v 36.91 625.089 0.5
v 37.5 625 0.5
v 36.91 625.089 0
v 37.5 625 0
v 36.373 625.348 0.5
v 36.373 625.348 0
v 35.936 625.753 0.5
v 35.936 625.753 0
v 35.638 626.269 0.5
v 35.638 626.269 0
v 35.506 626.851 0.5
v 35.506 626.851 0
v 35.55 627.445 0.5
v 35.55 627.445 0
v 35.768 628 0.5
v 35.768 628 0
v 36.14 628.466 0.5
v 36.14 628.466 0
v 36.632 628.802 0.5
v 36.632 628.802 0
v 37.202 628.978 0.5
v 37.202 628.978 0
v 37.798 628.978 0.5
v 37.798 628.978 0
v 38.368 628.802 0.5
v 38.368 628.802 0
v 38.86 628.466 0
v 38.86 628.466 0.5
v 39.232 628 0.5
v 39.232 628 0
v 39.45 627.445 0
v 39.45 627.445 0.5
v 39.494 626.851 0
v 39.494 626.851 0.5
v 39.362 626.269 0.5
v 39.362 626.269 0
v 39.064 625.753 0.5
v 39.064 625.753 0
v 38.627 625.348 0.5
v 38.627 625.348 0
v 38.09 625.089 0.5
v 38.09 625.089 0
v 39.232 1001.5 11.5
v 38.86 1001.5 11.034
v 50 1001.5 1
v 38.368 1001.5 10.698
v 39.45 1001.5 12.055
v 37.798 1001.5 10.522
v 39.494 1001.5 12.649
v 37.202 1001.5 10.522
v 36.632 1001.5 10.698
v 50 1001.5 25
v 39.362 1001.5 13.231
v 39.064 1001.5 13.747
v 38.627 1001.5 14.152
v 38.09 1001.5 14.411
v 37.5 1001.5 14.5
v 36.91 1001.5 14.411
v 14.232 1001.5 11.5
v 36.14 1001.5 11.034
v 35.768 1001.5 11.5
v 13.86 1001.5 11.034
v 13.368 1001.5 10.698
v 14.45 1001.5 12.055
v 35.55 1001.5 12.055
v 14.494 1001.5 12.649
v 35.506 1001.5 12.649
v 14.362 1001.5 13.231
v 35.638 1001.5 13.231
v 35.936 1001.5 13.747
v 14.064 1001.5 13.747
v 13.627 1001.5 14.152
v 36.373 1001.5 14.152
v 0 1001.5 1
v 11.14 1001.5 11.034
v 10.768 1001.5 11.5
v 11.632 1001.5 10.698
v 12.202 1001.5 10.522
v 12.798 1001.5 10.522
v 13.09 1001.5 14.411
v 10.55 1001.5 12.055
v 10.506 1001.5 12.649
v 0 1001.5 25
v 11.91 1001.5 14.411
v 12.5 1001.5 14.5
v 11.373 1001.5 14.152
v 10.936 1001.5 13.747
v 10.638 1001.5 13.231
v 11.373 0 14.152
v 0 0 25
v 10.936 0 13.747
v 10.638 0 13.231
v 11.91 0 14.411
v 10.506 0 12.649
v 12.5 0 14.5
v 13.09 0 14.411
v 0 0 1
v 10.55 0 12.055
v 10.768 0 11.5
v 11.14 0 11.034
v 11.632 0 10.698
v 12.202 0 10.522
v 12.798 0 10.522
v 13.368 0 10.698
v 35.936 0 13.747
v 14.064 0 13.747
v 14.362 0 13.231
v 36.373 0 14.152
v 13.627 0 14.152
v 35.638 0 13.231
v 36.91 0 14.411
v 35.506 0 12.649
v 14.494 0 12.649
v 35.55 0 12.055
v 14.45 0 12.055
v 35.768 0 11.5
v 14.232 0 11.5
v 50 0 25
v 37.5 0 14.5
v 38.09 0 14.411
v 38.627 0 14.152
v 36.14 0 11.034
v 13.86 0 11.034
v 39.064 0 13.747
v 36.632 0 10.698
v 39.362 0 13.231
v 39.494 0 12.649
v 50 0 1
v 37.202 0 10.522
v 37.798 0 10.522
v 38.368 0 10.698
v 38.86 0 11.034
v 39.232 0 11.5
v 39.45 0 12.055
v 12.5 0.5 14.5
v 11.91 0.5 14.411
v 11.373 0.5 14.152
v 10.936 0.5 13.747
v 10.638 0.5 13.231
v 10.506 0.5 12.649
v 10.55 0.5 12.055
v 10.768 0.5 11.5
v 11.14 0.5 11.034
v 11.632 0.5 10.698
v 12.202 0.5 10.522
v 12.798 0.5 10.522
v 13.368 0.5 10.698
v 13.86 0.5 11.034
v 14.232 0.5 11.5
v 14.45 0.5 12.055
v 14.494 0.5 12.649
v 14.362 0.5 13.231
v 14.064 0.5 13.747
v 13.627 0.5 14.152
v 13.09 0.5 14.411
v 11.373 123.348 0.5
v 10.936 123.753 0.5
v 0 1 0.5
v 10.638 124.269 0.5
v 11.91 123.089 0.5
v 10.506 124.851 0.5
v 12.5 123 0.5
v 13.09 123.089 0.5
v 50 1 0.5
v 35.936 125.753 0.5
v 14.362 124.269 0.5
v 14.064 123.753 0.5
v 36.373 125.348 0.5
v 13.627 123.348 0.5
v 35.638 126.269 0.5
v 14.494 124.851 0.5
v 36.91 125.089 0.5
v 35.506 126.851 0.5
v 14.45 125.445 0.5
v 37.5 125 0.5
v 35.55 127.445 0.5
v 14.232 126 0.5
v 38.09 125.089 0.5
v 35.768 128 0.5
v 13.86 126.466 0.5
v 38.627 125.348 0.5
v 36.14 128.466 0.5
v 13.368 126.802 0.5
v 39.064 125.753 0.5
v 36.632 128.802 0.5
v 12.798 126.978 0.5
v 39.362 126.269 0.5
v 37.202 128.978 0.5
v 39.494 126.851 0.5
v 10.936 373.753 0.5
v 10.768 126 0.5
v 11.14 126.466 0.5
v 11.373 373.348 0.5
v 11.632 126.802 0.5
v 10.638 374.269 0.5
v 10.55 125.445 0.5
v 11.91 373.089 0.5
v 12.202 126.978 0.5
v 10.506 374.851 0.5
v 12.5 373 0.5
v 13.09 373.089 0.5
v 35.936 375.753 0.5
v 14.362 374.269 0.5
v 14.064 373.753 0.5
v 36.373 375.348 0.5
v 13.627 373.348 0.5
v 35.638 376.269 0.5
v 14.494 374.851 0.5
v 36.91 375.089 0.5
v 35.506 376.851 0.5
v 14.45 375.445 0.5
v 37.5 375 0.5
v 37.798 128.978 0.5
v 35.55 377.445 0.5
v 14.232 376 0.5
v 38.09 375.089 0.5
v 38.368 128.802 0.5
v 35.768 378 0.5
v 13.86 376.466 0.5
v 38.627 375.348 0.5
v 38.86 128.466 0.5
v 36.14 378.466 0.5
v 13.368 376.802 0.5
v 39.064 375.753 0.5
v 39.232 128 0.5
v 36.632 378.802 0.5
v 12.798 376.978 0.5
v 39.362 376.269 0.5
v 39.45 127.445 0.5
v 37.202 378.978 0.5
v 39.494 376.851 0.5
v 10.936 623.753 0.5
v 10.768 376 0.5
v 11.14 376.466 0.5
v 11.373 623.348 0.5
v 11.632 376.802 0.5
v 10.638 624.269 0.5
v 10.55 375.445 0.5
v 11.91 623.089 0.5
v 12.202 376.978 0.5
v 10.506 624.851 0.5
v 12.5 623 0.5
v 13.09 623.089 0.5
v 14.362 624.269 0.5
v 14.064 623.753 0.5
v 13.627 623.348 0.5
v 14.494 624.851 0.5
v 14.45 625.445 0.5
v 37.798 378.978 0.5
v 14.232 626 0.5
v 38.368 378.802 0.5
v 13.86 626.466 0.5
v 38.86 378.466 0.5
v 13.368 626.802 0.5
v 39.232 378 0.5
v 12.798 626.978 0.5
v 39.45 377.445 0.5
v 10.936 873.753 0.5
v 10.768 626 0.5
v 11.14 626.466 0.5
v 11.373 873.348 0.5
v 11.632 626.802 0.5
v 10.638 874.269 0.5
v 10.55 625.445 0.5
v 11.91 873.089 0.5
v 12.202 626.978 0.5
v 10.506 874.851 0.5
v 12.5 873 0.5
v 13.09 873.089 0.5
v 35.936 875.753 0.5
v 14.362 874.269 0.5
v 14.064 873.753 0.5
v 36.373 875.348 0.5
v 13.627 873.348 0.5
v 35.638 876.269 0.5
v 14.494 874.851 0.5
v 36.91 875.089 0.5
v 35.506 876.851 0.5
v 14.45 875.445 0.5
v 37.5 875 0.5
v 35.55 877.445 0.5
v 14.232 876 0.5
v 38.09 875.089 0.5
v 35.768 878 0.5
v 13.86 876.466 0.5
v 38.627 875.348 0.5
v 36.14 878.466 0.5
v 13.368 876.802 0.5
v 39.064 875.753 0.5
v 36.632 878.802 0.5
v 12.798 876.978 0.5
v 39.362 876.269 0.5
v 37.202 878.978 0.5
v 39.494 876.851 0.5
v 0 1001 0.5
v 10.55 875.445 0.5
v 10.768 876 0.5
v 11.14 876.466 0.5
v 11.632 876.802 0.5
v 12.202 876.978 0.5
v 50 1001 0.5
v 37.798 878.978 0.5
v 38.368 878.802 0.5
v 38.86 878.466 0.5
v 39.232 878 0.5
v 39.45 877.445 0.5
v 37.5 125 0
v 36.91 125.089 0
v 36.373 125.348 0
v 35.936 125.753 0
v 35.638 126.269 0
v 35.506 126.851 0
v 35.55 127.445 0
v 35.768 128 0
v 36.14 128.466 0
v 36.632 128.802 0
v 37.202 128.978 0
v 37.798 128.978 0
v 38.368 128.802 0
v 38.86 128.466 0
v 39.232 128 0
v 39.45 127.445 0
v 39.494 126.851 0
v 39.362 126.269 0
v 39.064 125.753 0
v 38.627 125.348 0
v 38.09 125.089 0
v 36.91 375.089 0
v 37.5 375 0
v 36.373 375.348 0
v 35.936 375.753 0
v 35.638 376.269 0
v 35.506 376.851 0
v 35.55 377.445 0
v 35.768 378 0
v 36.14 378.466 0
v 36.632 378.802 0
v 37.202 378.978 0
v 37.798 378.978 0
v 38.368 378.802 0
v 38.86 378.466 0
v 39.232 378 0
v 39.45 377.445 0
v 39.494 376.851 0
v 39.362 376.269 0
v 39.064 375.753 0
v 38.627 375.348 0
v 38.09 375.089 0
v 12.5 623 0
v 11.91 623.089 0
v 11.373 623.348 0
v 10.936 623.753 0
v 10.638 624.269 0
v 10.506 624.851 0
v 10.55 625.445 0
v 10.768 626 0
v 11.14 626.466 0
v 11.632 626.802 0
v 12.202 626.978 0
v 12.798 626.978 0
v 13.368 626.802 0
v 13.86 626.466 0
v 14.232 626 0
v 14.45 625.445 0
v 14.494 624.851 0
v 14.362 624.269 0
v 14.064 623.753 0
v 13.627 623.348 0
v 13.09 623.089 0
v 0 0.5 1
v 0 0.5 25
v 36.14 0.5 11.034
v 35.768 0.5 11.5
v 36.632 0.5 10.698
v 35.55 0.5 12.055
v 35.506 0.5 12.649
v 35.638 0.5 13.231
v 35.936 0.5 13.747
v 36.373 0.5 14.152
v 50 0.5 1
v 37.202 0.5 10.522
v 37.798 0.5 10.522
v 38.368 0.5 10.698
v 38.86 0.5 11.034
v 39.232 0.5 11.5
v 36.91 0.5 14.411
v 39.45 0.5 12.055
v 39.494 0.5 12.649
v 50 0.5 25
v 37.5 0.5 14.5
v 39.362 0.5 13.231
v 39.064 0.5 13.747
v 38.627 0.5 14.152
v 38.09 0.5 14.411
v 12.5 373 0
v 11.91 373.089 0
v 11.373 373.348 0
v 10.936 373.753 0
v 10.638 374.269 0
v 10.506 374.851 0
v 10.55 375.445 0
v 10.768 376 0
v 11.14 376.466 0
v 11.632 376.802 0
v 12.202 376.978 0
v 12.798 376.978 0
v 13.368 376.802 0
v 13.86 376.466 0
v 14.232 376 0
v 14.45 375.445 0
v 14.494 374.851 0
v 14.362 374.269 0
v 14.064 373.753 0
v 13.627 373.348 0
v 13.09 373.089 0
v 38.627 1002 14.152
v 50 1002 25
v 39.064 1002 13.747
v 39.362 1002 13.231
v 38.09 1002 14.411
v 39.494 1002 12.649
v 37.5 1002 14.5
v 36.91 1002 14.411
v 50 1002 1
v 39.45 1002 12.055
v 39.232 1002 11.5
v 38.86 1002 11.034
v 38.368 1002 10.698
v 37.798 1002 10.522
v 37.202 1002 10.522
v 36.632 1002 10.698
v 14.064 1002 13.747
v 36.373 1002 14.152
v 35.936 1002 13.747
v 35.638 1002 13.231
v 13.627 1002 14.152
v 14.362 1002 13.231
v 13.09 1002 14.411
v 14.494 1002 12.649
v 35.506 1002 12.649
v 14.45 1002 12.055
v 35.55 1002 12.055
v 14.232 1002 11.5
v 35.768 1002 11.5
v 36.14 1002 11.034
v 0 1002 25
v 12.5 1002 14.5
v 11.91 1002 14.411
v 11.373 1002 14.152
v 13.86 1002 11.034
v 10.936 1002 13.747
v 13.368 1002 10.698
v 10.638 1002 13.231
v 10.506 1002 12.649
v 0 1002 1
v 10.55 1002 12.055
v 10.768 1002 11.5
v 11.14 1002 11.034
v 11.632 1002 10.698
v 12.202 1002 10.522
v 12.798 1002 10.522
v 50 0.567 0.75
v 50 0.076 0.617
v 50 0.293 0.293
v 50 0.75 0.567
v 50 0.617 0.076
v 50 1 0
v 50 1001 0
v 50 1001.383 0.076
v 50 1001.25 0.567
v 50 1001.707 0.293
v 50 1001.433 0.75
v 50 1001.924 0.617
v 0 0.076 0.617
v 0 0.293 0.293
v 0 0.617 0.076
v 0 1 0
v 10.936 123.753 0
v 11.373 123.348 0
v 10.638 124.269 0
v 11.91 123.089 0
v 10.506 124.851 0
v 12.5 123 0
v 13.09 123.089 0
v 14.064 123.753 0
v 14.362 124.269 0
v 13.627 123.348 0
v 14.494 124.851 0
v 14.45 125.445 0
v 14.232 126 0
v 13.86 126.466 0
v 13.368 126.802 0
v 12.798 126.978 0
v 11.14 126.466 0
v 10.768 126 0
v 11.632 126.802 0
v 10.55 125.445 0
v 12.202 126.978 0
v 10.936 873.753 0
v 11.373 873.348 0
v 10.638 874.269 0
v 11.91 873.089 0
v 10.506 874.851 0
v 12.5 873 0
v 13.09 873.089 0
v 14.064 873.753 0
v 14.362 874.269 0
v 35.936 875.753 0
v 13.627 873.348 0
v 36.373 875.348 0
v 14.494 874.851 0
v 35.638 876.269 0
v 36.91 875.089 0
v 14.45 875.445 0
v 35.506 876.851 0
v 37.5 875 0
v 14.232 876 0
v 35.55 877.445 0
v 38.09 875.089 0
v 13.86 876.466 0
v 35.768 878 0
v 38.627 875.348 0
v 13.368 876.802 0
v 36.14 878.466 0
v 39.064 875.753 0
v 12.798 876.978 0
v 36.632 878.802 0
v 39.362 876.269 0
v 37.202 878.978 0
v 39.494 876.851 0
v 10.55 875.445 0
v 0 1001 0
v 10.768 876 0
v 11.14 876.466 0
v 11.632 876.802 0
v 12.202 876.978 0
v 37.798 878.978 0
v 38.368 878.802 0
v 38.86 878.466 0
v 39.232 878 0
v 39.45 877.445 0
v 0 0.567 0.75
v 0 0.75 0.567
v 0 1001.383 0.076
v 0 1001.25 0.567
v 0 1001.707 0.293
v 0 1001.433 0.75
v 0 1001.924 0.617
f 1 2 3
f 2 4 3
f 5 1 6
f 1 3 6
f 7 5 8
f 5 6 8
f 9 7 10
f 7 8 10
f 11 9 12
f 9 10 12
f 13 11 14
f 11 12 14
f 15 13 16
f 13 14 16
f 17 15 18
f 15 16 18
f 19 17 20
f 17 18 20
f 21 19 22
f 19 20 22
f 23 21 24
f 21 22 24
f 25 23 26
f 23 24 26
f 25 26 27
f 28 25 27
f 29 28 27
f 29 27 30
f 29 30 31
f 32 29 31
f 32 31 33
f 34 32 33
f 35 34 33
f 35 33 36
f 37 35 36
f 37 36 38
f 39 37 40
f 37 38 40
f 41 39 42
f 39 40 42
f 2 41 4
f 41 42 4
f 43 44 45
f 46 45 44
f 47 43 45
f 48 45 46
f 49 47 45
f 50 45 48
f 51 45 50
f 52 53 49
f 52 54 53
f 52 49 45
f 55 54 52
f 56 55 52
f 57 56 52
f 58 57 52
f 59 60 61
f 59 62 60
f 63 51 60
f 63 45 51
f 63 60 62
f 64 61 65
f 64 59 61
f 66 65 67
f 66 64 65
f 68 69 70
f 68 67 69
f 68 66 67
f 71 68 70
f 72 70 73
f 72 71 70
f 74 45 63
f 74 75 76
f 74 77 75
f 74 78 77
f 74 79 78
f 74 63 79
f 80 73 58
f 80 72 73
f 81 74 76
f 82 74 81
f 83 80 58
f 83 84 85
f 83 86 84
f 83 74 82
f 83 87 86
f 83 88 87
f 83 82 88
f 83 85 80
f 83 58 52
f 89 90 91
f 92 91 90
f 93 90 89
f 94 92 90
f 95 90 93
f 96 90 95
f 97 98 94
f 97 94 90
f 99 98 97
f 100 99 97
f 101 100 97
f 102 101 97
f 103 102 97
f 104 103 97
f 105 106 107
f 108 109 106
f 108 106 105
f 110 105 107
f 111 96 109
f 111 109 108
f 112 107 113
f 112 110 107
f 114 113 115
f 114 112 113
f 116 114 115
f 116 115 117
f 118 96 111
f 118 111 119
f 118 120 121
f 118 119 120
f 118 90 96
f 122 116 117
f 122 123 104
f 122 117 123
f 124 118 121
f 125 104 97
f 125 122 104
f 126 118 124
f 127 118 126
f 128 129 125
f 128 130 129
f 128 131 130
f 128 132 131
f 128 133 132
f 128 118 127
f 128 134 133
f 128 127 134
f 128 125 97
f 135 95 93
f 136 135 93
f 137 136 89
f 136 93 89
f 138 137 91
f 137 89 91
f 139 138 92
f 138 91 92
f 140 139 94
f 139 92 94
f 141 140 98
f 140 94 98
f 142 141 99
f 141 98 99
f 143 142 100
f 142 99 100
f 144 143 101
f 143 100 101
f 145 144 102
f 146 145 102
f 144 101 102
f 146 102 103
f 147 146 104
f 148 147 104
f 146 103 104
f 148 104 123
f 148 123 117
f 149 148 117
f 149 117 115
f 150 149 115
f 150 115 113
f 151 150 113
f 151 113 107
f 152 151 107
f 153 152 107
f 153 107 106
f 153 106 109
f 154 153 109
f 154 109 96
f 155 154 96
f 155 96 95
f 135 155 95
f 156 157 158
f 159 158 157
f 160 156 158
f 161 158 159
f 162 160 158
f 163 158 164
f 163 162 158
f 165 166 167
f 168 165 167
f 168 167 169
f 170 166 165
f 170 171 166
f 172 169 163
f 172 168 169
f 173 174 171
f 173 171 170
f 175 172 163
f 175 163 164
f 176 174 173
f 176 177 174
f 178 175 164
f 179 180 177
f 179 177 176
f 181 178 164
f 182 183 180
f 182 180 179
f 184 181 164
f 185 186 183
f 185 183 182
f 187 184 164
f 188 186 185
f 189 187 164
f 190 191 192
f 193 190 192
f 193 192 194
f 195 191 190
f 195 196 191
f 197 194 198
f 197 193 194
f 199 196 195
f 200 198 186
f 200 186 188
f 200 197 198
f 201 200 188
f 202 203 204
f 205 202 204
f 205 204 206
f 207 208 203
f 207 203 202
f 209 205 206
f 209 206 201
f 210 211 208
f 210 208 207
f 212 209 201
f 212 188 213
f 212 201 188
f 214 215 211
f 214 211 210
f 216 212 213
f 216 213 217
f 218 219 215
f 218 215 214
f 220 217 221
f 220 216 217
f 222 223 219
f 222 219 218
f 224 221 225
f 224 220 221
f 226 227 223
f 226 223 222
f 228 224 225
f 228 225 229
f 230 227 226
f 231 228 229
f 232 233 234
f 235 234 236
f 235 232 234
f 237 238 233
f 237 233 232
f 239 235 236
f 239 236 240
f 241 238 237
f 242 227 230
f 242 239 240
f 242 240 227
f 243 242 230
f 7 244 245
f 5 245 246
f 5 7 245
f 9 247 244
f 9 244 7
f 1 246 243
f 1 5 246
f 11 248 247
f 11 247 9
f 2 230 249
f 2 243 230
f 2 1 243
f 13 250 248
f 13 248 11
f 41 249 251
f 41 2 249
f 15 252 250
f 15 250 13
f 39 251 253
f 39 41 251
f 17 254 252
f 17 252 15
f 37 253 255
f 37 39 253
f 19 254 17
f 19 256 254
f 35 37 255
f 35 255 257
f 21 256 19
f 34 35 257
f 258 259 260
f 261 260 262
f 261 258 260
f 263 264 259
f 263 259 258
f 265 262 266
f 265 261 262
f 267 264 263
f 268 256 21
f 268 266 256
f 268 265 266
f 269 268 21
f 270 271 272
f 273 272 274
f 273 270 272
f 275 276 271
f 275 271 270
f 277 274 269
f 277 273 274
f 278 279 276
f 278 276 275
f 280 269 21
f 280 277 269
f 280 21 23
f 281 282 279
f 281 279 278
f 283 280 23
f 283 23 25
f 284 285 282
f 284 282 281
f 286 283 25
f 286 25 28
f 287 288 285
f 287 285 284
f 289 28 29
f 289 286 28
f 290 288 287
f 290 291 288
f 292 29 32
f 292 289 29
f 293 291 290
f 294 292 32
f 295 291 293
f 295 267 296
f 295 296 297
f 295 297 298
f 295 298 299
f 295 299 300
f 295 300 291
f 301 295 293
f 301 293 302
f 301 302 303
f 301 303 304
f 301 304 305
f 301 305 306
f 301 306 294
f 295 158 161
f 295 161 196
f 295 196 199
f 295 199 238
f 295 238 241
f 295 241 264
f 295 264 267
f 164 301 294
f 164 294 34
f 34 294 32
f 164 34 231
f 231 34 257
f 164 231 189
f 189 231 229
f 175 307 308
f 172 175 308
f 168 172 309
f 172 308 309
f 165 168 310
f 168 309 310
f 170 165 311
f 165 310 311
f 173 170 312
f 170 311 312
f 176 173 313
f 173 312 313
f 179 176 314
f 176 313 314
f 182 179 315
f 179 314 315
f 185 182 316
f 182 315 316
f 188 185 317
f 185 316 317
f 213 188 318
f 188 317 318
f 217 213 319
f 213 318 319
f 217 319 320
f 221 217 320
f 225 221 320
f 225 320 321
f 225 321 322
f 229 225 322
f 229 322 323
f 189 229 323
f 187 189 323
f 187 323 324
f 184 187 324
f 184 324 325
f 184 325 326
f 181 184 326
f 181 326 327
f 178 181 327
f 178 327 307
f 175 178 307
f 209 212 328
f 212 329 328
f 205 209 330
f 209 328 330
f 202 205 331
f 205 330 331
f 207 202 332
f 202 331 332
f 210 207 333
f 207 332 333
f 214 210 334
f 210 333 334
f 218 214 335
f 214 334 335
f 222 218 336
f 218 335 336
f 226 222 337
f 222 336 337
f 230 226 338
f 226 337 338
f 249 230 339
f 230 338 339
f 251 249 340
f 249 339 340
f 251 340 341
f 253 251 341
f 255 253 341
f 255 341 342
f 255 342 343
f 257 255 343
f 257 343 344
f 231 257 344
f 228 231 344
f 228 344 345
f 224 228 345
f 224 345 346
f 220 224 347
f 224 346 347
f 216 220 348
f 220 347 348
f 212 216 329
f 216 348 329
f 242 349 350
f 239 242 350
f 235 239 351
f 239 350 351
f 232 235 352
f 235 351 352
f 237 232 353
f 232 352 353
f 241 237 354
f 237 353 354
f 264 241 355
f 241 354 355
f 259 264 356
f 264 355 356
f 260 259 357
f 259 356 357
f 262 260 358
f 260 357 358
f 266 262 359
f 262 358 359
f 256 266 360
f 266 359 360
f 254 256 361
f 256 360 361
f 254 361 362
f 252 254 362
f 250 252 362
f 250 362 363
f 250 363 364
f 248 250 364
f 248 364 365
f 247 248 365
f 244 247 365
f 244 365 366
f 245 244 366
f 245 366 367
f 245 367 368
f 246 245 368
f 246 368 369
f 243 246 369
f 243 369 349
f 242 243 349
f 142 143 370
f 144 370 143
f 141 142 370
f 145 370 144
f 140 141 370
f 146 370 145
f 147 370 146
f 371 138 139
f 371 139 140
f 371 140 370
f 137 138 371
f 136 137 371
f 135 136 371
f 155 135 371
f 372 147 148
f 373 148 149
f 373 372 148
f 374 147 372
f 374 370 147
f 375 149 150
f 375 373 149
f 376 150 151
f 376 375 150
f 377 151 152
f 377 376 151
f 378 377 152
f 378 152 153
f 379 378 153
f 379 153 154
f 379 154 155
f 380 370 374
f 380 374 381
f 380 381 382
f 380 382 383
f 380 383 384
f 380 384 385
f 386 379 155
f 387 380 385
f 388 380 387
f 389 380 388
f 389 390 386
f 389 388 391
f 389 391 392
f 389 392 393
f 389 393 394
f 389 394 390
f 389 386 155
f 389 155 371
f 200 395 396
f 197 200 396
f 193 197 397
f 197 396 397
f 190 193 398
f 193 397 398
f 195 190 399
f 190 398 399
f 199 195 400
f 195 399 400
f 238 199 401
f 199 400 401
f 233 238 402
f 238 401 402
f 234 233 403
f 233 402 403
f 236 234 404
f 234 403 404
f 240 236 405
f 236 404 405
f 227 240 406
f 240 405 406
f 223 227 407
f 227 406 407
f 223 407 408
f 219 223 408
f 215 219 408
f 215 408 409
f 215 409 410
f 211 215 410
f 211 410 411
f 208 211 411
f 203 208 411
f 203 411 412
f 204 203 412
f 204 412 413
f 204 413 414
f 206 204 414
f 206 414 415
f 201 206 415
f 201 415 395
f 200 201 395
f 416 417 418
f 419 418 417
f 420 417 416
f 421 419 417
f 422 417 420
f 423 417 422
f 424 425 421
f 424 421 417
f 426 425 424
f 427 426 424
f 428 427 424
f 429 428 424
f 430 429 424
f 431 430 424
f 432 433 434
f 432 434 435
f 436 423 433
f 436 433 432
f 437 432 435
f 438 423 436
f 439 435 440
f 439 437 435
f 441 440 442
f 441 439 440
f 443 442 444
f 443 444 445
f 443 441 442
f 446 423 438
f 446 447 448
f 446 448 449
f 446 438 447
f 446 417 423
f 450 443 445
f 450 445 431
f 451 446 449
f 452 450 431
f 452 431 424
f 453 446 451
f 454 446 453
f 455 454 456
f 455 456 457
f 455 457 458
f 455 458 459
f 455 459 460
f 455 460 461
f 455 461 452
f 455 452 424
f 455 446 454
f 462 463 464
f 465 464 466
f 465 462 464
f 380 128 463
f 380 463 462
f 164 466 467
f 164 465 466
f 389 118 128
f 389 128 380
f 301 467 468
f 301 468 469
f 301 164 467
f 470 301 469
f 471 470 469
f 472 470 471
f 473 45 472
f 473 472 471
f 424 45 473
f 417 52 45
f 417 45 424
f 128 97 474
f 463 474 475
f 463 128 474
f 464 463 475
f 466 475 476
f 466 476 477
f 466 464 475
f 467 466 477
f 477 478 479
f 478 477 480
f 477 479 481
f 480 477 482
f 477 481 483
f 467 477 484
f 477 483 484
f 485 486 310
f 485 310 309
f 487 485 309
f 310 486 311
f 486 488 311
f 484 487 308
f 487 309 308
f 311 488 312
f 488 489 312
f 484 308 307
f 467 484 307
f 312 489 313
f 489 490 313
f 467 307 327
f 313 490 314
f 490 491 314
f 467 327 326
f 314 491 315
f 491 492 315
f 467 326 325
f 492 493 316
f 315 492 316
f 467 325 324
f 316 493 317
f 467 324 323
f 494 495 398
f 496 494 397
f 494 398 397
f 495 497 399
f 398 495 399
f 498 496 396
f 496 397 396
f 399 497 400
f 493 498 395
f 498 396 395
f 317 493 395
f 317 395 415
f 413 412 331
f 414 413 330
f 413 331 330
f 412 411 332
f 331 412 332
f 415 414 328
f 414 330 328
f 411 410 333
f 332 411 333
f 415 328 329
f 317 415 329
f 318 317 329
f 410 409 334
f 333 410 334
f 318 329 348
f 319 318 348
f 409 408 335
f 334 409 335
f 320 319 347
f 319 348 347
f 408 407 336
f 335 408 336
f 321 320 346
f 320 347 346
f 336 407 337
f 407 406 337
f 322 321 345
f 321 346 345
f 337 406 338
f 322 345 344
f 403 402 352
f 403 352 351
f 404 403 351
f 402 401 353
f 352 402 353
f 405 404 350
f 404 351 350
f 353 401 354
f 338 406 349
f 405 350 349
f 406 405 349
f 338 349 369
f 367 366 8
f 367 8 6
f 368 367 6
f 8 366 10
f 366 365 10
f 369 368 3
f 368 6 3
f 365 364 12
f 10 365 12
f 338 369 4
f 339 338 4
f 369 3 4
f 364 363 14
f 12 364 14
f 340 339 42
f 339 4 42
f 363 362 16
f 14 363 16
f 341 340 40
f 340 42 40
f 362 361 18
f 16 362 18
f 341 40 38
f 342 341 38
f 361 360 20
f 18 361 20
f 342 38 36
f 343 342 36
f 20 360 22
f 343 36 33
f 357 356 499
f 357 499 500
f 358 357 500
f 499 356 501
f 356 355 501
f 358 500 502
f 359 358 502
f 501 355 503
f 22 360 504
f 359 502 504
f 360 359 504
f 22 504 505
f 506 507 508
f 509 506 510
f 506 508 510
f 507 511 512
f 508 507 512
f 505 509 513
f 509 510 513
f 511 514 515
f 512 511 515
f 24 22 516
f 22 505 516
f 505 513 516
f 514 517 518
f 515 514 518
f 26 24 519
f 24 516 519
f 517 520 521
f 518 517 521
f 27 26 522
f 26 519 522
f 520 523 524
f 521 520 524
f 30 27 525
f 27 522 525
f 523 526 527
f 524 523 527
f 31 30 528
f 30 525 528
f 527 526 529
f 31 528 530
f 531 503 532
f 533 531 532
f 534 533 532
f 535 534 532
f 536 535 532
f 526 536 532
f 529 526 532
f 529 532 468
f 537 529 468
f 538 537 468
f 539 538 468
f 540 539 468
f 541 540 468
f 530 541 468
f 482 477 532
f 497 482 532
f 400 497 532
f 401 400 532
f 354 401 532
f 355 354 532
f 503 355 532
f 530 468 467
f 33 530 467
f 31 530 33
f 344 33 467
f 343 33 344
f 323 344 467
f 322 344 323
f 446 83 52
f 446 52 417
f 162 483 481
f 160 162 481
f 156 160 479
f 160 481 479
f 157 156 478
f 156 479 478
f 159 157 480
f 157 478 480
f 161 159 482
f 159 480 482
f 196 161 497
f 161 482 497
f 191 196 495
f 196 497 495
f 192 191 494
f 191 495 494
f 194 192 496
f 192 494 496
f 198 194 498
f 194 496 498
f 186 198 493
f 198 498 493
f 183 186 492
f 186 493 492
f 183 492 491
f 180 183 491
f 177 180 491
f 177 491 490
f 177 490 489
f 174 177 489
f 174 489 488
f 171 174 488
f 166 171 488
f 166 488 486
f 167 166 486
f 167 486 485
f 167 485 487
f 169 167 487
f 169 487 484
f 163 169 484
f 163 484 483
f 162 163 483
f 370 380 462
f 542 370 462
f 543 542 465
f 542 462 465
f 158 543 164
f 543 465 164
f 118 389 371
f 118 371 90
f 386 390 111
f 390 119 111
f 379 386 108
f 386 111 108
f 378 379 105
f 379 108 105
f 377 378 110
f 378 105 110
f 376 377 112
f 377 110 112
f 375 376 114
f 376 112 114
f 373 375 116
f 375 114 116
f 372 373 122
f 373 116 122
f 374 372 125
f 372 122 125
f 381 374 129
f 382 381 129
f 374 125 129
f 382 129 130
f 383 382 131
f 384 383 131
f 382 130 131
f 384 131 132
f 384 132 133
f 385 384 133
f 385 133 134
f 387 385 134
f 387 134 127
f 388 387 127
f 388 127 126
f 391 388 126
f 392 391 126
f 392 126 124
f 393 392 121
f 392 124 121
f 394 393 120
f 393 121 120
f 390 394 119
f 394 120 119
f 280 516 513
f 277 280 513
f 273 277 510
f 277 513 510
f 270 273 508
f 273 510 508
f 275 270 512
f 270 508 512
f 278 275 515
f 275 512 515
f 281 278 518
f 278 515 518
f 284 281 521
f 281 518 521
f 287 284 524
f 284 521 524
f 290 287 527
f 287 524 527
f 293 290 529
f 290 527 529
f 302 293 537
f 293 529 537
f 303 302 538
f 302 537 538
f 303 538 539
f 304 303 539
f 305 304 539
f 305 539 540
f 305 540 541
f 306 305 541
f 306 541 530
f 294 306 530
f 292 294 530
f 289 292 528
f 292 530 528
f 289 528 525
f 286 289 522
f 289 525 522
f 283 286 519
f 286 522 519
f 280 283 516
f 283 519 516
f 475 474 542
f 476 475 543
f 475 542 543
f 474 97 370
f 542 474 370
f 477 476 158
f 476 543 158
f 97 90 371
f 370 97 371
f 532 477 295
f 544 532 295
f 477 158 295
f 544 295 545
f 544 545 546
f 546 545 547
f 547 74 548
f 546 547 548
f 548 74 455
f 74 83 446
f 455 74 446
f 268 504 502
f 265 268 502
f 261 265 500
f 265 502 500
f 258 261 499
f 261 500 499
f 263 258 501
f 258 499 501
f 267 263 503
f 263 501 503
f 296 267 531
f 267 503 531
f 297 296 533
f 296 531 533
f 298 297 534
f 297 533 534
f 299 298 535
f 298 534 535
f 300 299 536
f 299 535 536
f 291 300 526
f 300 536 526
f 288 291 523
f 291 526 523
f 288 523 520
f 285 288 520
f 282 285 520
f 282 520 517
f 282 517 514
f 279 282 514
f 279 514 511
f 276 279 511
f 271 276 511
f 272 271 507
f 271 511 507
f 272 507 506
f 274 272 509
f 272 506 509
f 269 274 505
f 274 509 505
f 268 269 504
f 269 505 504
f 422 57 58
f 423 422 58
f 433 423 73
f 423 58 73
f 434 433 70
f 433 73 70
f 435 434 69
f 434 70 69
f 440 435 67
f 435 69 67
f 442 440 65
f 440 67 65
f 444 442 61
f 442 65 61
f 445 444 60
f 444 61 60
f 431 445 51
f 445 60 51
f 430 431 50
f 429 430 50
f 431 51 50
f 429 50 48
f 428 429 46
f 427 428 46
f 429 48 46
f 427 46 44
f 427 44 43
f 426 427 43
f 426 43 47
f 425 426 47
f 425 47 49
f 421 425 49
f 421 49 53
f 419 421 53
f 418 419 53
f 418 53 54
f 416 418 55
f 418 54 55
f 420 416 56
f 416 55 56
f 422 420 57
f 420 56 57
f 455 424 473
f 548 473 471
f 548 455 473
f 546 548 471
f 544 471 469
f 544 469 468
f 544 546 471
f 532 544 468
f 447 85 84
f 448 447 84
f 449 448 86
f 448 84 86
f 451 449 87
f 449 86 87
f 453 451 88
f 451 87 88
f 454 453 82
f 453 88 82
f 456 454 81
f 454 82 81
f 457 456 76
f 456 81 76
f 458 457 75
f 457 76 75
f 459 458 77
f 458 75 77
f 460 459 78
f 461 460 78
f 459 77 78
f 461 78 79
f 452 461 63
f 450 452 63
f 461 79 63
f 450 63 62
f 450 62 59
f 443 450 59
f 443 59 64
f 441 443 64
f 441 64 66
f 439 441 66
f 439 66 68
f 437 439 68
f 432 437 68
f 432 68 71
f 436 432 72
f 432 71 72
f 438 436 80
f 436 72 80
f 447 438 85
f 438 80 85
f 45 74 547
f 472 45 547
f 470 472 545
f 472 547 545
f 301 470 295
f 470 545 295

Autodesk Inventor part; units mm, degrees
ref_plane "YZ Plane" through (0, 0, 0) normal (1, 0, 0) x (0, 1, 0)
ref_plane "XZ Plane" through (0, 0, 0) normal (0, 1, 0) x (-1, 0, 0)
ref_plane "XY Plane" through (0, 0, 0) normal (0, 0, 1) x (1, 0, 0)
sketch "Sketch1" plane through (0, 0, 0) normal (0, 0, 1) x (1, 0, 0)
  line L0 (0, 0) -> (50, 0)
  line L1 (50, 0) -> (50, 1002)
  line L2 (50, 1002) -> (0, 1002)
  line L3 (0, 1002) -> (0, 0)
  dimension "d0" = 50
  dimension "d1" = 1002
extrude "Plate1" add sketch "Sketch1" along normal blind 0.5
sketch "Sketch2" plane through (0, 0, 0.5) normal (0, 0, 1) x (1, 0, 0)
  circle A0 centre (12.5, 125) radius 2
  line L0 (50, 0) -> (0, 0) projected
  line L1 (0, 0) -> (0, 1002) projected
  circle A1 centre (12.5, 375) radius 2
  circle A2 centre (12.5, 625) radius 2
  circle A3 centre (12.5, 875) radius 2
  circle A4 centre (37.5, 877) radius 2
  line L2 (50, 1002) -> (50, 0) projected
  line L3 (0, 1002) -> (50, 1002) projected
  circle A5 centre (37.5, 627) radius 2
  circle A6 centre (37.5, 377) radius 2
  circle A7 centre (37.5, 127) radius 2
  dimension "d3" = 4
  dimension "d4" = 125
  dimension "d5" = 12.5
  dimension "d6" = 4
  dimension "d7" = 250
  dimension "d8" = 12.5
  dimension "d9" = 4
  dimension "d10" = 250
  dimension "d11" = 12.5
  dimension "d12" = 4
  dimension "d13" = 250
  dimension "d14" = 12.5
  dimension "d15" = 4
  dimension "d16" = 12.5
  dimension "d17" = 125
  dimension "d18" = 4
  dimension "d19" = 250
  dimension "d20" = 12.5
  dimension "d21" = 4
  dimension "d22" = 250
  dimension "d23" = 12.5
  dimension "d24" = 4
  dimension "d25" = 250
  dimension "d26" = 12.5
hole "Hole1" at (12.5, 875, 0.5) at (37.5, 877, 0.5) at (37.5, 627, 0.5) at (12.5, 625, 0.5) at (37.5, 377, 0.5) at (12.5, 375, 0.5) at (37.5, 127, 0.5) at (12.5, 125, 0.5) direction (0, 0, -1) diameter 4 end through all
sketch "Sketch3" plane through (0, 1001.5, 0) normal (0, 1, 0) x (-1, 0, 0)
  line L0 (-50, 0) -> (0, 0)
  line L1 (0, 0) -> (0, 25)
  line L2 (0, 25) -> (-50, 25)
  line L3 (-50, 25) -> (-50, 0)
edge flange "Flange1" height 25 angle 90 thickness 0.5 bend radius 0.5 thickness toward (0, 1, 0) relief tear relief width 0.5 relief depth 0.25 edges at (25, 1002, 0.5) wall of the first edge with corners at (50, 1001.5, 0) (0, 1001.5, 0) (0, 1001.5, 25) (50, 1001.5, 25)
bend "Bend1"
corner "Corner1"
sketch "Sketch4" plane through (50, 0.5, 0) normal (0, -1, 0) x (1, 0, 0)
  line L0 (-50, 0) -> (0, 0)
  line L1 (0, 0) -> (0, 25)
  line L2 (0, 25) -> (-50, 25)
  line L3 (-50, 25) -> (-50, 0)
edge flange "Flange2" height 25 angle 90 thickness 0.5 bend radius 0.5 thickness toward (0, -1, 0) relief tear relief width 0.5 relief depth 0.25 edges at (25, 0, 0.5) wall of the first edge with corners at (0, 0.5, 0) (50, 0.5, 0) (50, 0.5, 25) (0, 0.5, 25)
bend "Bend2"
corner "Corner2"
sketch "Sketch5" plane through (0, 1002, 25) normal (0, 1, 0) x (1, 0, 0)
  circle A0 centre (12.5, 12.5) radius 2
  circle A1 centre (37.5, 12.5) radius 2
  line L0 (0, 0) -> (0, 24) projected
  line L1 (50, 24) -> (50, 0) projected
  line L2 (50, 0) -> (0, 0) projected
  point P0 (0, 25)
  dimension "d54" = 4
  dimension "d55" = 4
  dimension "d56" = 12.5
  dimension "d57" = 12.5
  dimension "d58" = 12.5
  dimension "d59" = 12.5
hole "Hole2" at (12.5, 1002, 12.5) at (37.5, 1002, 12.5) direction (0, -1, 0) diameter 4 end through all
equation "\"d0\" = A_width"
equation "\"d3\" = rivet_diameter"
equation "\"d4\" = 0.5 * rivet_displacement"
equation "\"d5\" = 0.25 * A_width"
equation "\"d6\" = rivet_diameter"
equation "\"d7\" = rivet_displacement"
equation "\"d8\" = 0.25 * A_width"
equation "\"d9\" = rivet_diameter"
equation "\"d10\" = rivet_displacement"
equation "\"d11\" = 0.25 * A_width"
equation "\"d12\" = rivet_diameter"
equation "\"d13\" = rivet_displacement"
equation "\"d14\" = 0.25 * A_width"
equation "\"d15\" = rivet_diameter"
equation "\"d16\" = 0.25 * A_width"
equation "\"d17\" = 0.5 * rivet_displacement"
equation "\"d18\" = rivet_diameter"
equation "\"d19\" = rivet_displacement"
equation "\"d20\" = 0.25 * A_width"
equation "\"d21\" = rivet_diameter"
equation "\"d22\" = rivet_displacement"
equation "\"d23\" = 0.25 * A_width"
equation "\"d24\" = rivet_diameter"
equation "\"d25\" = rivet_displacement"
equation "\"d26\" = 0.25 * A_width"
equation "\"d27\" = rivet_diameter"
equation "\"d32\" = Thickness"
equation "\"d54\" = rivet_diameter"
equation "\"d55\" = rivet_diameter"
equation "\"d56\" = 0.25 * A_width"
equation "\"d57\" = 0.25 * A_width"
equation "\"d58\" = 0.25 * A_width"
equation "\"d59\" = 0.25 * A_width"
equation "\"d60\" = rivet_diameter"
equation "\"d65\" = Thickness"
equation "\"d2\" = Thickness"
equation "\"d34\" = BendReliefWidth"
equation "\"d35\" = BendReliefDepth"
equation "\"d36\" = MinimumRemnant"
equation "\"d37\" = TransitionRadius"
equation "\"d38\" = 0.5 * A_width"
equation "\"d40\" = BendRadius"
equation "\"d41\" = CornerReliefSize"
equation "\"d42\" = GapSize"
equation "\"d43\" = JacobiRadiusSize"
equation "\"d44\" = BendReliefWidth"
equation "\"d45\" = BendReliefDepth"
equation "\"d46\" = MinimumRemnant"
equation "\"d47\" = TransitionRadius"
equation "\"d48\" = 0.5 * A_width"
equation "\"d50\" = BendRadius"
equation "\"d51\" = CornerReliefSize"
equation "\"d52\" = GapSize"
equation "\"d53\" = JacobiRadiusSize"
equation "\"BendRadius\" = Thickness"
equation "\"BendReliefWidth\" = Thickness"
equation "\"BendReliefDepth\" = 0.5 * Thickness"
equation "\"CornerReliefSize\" = 4 * Thickness"
equation "\"MinimumRemnant\" = 2 * Thickness"
equation "\"TransitionRadius\" = BendRadius"
equation "\"JacobiRadiusSize\" = BendRadius"
equation "\"GapSize\" = Thickness"
equation "\"A_width\" = 50"
equation "\"l___________\" = 0"
equation "\"l__________\" = 0"
equation "\"l_________\" = 0"
equation "\"rivet_diameter\" = 4"
equation "\"rivet_displacement\" = 250"
equation "\"l________\" = 0"
equation "\"plate_thickness\" = 2"
equation "\"Thickness\" = 0.5"
properties part number "A1_BeamCoverPlate"
